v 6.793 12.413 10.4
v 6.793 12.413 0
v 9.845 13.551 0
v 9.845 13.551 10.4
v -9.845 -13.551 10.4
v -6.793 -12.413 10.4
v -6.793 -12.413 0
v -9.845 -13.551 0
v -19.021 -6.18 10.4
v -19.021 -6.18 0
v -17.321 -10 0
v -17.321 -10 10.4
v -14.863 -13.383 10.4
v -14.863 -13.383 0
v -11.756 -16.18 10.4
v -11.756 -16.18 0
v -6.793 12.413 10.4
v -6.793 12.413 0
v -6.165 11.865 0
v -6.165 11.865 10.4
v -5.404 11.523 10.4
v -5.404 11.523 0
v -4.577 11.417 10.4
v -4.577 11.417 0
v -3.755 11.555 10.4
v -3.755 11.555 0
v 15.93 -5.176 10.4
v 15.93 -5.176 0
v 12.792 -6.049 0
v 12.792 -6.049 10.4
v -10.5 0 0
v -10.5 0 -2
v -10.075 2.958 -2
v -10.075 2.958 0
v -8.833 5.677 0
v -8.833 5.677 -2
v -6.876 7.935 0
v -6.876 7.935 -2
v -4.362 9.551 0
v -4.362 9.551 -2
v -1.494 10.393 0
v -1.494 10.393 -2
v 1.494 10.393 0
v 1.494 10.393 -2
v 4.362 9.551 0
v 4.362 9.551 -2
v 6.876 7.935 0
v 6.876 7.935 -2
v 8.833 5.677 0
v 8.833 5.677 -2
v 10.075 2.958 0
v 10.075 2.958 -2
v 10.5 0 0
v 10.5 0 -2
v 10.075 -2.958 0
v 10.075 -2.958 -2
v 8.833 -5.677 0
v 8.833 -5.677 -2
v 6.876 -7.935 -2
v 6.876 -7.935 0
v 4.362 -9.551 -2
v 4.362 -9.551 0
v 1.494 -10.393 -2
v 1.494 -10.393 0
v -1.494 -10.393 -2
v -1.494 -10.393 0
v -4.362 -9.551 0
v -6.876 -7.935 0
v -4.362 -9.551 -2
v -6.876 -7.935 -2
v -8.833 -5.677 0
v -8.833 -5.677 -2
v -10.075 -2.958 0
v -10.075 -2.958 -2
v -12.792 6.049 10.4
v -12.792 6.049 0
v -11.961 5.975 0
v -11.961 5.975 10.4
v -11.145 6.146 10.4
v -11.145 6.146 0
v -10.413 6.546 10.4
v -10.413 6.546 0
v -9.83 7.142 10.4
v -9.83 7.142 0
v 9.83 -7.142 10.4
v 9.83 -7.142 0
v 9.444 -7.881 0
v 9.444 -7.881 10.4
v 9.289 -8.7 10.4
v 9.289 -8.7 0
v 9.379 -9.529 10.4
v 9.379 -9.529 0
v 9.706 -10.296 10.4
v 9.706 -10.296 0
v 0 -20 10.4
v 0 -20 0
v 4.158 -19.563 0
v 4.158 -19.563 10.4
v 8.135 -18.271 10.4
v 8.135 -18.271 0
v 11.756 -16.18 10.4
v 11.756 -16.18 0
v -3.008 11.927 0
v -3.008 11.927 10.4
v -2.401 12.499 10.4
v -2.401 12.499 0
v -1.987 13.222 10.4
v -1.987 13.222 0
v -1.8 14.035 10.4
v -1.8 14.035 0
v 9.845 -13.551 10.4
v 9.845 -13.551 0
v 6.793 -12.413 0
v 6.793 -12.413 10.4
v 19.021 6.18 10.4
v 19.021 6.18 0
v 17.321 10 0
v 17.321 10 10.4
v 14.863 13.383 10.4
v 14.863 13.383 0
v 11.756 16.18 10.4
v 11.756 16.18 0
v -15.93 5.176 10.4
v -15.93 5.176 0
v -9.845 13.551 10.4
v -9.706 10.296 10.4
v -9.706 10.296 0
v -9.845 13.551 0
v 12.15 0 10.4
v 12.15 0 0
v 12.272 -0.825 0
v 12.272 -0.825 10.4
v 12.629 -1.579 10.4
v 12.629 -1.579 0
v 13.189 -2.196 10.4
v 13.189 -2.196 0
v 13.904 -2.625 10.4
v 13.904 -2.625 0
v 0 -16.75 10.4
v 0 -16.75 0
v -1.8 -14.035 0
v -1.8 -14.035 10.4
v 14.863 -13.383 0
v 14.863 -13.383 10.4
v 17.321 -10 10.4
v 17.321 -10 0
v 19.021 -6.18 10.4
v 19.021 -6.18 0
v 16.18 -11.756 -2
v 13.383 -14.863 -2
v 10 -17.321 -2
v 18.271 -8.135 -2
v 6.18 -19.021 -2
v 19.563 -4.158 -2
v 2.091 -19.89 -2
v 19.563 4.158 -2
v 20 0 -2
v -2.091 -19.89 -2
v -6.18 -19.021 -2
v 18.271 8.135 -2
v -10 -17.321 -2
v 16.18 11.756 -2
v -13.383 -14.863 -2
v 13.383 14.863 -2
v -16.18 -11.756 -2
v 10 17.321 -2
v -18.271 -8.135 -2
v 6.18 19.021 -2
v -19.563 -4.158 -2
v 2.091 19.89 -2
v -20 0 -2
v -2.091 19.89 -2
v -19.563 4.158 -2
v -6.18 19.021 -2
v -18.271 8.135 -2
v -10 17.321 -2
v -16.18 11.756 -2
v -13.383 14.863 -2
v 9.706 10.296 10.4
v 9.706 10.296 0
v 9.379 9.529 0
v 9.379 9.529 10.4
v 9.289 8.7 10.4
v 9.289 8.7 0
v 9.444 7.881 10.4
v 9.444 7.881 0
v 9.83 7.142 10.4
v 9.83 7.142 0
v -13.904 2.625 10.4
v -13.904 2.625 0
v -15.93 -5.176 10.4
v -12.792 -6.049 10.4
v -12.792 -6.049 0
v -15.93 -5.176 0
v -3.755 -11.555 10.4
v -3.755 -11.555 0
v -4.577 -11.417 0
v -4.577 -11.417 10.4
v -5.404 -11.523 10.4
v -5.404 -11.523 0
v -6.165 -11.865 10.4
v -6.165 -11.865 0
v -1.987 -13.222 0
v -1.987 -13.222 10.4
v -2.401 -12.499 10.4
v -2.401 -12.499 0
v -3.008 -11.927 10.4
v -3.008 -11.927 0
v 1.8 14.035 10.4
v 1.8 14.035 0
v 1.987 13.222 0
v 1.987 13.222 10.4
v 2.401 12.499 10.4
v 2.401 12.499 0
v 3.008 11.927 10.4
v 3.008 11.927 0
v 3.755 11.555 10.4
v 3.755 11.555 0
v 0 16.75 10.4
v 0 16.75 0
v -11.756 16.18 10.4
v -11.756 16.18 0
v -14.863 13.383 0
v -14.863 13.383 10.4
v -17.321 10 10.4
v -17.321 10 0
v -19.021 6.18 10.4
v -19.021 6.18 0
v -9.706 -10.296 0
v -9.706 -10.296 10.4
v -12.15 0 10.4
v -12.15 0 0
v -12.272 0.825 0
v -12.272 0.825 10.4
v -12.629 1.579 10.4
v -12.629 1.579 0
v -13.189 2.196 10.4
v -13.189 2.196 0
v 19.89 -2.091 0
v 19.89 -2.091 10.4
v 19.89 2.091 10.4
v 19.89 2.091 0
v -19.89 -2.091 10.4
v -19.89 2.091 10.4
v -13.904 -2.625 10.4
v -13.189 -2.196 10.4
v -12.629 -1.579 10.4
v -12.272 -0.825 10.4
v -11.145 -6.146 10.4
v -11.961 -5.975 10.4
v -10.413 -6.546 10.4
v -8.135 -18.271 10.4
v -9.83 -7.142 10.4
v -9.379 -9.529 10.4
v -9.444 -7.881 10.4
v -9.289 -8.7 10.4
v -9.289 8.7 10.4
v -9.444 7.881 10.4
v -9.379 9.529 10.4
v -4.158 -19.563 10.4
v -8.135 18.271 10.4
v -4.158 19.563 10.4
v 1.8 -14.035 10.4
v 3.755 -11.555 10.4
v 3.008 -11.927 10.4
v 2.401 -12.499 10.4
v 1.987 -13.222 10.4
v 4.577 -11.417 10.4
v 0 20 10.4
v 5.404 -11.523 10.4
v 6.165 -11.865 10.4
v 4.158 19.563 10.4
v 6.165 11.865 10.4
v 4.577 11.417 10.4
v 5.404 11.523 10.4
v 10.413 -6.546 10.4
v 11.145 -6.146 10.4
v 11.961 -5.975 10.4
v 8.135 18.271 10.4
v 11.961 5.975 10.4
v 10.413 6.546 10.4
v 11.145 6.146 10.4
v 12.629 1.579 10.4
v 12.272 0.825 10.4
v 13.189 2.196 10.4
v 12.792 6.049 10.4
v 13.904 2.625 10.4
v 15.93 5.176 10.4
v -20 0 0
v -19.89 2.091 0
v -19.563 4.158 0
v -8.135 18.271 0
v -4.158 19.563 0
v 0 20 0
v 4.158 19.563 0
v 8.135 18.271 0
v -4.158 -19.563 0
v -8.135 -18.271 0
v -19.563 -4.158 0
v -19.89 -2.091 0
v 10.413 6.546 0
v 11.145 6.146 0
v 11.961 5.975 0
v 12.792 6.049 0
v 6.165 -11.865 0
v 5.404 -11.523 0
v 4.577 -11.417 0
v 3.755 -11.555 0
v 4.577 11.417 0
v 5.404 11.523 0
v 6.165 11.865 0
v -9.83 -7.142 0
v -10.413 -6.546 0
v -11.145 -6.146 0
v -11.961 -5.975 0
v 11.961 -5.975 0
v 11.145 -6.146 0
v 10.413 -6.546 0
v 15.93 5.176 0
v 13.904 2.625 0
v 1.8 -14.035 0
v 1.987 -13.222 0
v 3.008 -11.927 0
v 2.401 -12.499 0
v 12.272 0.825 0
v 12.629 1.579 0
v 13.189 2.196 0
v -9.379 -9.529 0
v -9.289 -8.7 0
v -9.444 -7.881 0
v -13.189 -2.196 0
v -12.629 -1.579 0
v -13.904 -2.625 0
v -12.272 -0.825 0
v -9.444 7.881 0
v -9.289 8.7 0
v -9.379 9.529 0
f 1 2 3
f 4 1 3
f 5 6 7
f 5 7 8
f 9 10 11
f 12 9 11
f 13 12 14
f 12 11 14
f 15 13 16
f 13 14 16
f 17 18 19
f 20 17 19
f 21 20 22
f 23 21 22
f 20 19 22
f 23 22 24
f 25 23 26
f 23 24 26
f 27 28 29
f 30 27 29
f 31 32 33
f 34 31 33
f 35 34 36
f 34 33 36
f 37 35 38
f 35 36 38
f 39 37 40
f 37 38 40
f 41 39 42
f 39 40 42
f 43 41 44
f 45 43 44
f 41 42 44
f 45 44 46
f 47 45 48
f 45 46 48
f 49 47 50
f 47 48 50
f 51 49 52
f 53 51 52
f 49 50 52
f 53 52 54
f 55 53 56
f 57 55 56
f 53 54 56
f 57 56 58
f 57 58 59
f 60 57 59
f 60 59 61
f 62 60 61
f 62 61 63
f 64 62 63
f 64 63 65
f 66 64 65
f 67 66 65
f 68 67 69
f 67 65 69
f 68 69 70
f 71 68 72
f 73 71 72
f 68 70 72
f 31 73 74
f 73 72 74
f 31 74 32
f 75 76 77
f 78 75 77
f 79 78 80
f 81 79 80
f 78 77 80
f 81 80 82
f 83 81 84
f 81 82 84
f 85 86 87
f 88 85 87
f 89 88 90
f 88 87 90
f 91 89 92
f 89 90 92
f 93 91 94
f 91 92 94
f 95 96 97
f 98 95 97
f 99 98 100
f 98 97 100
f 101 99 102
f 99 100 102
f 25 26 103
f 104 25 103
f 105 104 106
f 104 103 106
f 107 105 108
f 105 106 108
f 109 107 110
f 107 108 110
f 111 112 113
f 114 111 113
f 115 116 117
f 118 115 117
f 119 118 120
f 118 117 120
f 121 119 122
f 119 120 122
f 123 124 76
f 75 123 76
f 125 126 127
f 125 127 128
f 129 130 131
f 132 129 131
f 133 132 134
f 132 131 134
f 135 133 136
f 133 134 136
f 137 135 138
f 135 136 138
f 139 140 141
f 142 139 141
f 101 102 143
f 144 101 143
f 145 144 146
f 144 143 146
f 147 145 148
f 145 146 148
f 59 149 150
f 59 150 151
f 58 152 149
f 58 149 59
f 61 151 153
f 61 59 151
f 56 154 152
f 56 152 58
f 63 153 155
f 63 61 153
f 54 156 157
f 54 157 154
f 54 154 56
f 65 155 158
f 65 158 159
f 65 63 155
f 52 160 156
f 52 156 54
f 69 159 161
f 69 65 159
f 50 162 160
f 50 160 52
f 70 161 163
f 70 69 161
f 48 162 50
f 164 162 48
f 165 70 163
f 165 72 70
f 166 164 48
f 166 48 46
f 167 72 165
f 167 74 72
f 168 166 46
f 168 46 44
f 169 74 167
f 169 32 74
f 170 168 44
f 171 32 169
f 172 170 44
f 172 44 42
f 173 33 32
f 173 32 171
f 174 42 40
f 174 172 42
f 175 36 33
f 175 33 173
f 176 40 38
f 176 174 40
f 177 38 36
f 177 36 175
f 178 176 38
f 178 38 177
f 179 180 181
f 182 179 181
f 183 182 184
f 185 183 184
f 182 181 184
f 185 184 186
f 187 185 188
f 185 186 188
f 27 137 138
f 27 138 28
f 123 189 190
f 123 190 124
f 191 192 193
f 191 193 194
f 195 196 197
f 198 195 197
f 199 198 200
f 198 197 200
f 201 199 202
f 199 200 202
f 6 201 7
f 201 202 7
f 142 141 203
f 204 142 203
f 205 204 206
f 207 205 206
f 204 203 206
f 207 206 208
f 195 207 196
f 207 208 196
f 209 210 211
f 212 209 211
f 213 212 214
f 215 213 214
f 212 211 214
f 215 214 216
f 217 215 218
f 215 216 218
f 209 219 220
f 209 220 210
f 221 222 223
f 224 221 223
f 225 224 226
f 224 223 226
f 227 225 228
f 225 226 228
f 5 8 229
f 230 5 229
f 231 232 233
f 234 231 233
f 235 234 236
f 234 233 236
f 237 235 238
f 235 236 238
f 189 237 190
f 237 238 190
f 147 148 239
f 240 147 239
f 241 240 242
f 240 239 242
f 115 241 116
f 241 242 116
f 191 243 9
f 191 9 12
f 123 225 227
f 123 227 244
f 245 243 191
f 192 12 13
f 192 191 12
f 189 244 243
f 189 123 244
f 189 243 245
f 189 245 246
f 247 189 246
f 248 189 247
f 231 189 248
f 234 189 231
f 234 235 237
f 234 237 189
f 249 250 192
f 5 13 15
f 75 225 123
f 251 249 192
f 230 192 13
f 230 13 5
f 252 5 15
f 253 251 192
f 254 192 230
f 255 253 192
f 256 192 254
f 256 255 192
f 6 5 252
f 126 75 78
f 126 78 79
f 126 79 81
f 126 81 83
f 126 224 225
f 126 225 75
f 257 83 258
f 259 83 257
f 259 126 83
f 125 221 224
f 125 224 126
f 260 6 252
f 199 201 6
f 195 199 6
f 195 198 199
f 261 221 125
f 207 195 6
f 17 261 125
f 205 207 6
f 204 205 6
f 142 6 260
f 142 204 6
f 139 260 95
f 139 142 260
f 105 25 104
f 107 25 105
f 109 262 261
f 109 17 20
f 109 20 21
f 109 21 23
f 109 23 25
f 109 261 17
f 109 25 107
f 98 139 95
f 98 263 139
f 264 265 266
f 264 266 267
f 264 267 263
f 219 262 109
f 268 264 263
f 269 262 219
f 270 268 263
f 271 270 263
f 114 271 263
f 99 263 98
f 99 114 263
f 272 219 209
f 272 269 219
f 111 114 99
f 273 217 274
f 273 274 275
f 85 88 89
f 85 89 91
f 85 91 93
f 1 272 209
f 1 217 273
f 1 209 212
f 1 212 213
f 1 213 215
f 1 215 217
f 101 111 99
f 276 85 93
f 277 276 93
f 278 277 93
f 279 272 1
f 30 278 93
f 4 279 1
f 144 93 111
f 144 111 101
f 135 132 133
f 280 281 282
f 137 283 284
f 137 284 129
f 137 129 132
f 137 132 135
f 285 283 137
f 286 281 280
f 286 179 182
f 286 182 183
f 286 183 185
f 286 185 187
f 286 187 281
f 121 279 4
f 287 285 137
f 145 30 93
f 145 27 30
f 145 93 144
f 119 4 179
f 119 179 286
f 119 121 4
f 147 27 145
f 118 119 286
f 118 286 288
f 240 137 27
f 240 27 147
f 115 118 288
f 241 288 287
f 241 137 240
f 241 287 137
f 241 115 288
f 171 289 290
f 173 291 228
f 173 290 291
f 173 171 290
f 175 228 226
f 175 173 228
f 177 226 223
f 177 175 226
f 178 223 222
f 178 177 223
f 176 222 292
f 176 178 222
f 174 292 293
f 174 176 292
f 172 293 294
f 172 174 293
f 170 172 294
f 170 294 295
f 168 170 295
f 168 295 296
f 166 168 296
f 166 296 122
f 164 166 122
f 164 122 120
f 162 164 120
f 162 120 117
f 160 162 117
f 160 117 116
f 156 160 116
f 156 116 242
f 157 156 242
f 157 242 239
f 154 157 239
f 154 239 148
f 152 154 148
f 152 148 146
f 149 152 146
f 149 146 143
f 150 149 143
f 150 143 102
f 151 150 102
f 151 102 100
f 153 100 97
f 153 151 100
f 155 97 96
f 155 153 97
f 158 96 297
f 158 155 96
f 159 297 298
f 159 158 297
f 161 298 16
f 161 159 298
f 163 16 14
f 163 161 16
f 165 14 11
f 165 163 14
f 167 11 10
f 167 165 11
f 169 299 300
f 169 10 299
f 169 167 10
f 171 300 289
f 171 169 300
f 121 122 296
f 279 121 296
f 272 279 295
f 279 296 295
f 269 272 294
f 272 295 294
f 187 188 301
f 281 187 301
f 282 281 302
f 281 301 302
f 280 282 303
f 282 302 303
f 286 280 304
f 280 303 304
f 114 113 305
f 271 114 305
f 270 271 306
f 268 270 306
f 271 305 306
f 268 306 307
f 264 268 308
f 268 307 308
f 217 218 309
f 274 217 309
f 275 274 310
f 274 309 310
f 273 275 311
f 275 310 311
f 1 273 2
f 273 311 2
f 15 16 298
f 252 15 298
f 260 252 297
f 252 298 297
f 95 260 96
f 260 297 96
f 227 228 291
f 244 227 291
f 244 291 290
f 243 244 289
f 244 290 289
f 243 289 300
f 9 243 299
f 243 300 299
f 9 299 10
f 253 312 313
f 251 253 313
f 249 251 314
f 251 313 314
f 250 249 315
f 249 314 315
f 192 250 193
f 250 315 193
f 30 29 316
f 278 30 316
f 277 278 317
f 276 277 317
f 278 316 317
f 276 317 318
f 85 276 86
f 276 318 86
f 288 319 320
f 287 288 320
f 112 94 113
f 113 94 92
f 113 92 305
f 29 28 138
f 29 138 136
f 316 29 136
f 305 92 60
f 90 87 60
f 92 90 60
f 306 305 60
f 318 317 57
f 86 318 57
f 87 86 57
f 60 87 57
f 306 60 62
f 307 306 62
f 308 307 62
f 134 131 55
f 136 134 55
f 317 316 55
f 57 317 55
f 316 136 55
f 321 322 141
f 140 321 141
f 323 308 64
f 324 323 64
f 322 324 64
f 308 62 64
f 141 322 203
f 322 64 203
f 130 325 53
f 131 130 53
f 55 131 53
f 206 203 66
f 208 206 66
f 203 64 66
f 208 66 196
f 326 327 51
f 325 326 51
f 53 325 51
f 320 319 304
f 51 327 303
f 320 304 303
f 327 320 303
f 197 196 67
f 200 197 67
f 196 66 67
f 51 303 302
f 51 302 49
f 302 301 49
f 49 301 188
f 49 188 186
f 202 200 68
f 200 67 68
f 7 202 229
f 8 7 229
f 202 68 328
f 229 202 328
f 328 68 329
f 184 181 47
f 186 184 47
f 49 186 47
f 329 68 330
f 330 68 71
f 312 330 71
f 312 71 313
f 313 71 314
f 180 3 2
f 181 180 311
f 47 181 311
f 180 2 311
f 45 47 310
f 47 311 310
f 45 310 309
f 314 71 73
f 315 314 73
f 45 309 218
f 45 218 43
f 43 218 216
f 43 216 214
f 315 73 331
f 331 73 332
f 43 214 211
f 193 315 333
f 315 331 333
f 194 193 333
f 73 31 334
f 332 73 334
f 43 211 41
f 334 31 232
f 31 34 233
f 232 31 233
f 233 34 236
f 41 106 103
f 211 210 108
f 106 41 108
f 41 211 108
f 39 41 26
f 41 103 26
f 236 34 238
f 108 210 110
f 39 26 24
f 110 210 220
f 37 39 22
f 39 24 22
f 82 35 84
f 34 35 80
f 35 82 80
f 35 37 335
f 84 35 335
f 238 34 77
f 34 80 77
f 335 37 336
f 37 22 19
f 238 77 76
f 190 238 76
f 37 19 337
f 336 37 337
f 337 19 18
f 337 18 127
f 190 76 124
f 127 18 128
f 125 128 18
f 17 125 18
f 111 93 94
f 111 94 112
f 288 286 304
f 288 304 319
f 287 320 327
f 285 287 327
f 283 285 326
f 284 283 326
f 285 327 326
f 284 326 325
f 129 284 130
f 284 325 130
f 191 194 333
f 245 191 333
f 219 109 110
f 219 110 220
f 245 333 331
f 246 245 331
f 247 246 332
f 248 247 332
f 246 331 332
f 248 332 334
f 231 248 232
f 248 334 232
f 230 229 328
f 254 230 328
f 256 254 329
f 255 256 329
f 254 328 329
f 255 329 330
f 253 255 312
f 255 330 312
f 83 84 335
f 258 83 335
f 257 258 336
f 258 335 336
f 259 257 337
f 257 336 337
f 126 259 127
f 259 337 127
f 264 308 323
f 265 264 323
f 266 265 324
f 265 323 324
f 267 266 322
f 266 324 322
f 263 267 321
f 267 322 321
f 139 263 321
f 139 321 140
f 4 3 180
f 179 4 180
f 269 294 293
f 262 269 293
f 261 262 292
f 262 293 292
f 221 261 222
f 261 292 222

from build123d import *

# Parameters (mm, degrees)
BOSS_EXTRUDE1_DEPTH = 10.4
CIRPATTERN1_COUNT   = 10
BOSS_EXTRUDE2_START = 2
SKETCH2_R           = 20
SKETCH2_R_2         = 10.5
BOSS_EXTRUDE2_DEPTH = 2


with BuildPart() as part:
    # Sketch1 → Boss-Extrude1 (new body)
    with BuildSketch(Plane.XY):
        with BuildLine():
            Line((6.793214092, 12.412684734), (9.845402976, 13.551034656))
            Line((9.845402976, 13.551034656), (11.755705046, 16.180339887))
            ThreePointArc((11.755705046, 16.180339887), (6.180339887, 19.021130326), (0, 20))
            Line((0, 20), (0, 16.75))
            Line((0, 16.75), (1.800167381, 14.035023954))
            ThreePointArc((1.800167381, 14.035023954), (3.754556482, 11.555336673), (6.793214092, 12.412684734))
        make_face()
    boss_extrude1 = extrude(amount=BOSS_EXTRUDE1_DEPTH)

    # CirPattern1: Boss-Extrude1 ×10 about axis
    cirpattern1_axis = Axis((0, 0, -0.52), (0, 0, 1))
    for i in range(1, CIRPATTERN1_COUNT):
        add(boss_extrude1.rotate(cirpattern1_axis, i * 360 / CIRPATTERN1_COUNT))

    # Sketch2 → Boss-Extrude2 (add)
    with BuildSketch(Plane(origin=(0, 0, 0), x_dir=(-1, 0, 0), z_dir=(0, 0, -1)).offset(BOSS_EXTRUDE2_START)):
        Circle(SKETCH2_R)
        Circle(SKETCH2_R_2, mode=Mode.SUBTRACT)
    extrude(amount=-BOSS_EXTRUDE2_DEPTH)


solid = part.part
